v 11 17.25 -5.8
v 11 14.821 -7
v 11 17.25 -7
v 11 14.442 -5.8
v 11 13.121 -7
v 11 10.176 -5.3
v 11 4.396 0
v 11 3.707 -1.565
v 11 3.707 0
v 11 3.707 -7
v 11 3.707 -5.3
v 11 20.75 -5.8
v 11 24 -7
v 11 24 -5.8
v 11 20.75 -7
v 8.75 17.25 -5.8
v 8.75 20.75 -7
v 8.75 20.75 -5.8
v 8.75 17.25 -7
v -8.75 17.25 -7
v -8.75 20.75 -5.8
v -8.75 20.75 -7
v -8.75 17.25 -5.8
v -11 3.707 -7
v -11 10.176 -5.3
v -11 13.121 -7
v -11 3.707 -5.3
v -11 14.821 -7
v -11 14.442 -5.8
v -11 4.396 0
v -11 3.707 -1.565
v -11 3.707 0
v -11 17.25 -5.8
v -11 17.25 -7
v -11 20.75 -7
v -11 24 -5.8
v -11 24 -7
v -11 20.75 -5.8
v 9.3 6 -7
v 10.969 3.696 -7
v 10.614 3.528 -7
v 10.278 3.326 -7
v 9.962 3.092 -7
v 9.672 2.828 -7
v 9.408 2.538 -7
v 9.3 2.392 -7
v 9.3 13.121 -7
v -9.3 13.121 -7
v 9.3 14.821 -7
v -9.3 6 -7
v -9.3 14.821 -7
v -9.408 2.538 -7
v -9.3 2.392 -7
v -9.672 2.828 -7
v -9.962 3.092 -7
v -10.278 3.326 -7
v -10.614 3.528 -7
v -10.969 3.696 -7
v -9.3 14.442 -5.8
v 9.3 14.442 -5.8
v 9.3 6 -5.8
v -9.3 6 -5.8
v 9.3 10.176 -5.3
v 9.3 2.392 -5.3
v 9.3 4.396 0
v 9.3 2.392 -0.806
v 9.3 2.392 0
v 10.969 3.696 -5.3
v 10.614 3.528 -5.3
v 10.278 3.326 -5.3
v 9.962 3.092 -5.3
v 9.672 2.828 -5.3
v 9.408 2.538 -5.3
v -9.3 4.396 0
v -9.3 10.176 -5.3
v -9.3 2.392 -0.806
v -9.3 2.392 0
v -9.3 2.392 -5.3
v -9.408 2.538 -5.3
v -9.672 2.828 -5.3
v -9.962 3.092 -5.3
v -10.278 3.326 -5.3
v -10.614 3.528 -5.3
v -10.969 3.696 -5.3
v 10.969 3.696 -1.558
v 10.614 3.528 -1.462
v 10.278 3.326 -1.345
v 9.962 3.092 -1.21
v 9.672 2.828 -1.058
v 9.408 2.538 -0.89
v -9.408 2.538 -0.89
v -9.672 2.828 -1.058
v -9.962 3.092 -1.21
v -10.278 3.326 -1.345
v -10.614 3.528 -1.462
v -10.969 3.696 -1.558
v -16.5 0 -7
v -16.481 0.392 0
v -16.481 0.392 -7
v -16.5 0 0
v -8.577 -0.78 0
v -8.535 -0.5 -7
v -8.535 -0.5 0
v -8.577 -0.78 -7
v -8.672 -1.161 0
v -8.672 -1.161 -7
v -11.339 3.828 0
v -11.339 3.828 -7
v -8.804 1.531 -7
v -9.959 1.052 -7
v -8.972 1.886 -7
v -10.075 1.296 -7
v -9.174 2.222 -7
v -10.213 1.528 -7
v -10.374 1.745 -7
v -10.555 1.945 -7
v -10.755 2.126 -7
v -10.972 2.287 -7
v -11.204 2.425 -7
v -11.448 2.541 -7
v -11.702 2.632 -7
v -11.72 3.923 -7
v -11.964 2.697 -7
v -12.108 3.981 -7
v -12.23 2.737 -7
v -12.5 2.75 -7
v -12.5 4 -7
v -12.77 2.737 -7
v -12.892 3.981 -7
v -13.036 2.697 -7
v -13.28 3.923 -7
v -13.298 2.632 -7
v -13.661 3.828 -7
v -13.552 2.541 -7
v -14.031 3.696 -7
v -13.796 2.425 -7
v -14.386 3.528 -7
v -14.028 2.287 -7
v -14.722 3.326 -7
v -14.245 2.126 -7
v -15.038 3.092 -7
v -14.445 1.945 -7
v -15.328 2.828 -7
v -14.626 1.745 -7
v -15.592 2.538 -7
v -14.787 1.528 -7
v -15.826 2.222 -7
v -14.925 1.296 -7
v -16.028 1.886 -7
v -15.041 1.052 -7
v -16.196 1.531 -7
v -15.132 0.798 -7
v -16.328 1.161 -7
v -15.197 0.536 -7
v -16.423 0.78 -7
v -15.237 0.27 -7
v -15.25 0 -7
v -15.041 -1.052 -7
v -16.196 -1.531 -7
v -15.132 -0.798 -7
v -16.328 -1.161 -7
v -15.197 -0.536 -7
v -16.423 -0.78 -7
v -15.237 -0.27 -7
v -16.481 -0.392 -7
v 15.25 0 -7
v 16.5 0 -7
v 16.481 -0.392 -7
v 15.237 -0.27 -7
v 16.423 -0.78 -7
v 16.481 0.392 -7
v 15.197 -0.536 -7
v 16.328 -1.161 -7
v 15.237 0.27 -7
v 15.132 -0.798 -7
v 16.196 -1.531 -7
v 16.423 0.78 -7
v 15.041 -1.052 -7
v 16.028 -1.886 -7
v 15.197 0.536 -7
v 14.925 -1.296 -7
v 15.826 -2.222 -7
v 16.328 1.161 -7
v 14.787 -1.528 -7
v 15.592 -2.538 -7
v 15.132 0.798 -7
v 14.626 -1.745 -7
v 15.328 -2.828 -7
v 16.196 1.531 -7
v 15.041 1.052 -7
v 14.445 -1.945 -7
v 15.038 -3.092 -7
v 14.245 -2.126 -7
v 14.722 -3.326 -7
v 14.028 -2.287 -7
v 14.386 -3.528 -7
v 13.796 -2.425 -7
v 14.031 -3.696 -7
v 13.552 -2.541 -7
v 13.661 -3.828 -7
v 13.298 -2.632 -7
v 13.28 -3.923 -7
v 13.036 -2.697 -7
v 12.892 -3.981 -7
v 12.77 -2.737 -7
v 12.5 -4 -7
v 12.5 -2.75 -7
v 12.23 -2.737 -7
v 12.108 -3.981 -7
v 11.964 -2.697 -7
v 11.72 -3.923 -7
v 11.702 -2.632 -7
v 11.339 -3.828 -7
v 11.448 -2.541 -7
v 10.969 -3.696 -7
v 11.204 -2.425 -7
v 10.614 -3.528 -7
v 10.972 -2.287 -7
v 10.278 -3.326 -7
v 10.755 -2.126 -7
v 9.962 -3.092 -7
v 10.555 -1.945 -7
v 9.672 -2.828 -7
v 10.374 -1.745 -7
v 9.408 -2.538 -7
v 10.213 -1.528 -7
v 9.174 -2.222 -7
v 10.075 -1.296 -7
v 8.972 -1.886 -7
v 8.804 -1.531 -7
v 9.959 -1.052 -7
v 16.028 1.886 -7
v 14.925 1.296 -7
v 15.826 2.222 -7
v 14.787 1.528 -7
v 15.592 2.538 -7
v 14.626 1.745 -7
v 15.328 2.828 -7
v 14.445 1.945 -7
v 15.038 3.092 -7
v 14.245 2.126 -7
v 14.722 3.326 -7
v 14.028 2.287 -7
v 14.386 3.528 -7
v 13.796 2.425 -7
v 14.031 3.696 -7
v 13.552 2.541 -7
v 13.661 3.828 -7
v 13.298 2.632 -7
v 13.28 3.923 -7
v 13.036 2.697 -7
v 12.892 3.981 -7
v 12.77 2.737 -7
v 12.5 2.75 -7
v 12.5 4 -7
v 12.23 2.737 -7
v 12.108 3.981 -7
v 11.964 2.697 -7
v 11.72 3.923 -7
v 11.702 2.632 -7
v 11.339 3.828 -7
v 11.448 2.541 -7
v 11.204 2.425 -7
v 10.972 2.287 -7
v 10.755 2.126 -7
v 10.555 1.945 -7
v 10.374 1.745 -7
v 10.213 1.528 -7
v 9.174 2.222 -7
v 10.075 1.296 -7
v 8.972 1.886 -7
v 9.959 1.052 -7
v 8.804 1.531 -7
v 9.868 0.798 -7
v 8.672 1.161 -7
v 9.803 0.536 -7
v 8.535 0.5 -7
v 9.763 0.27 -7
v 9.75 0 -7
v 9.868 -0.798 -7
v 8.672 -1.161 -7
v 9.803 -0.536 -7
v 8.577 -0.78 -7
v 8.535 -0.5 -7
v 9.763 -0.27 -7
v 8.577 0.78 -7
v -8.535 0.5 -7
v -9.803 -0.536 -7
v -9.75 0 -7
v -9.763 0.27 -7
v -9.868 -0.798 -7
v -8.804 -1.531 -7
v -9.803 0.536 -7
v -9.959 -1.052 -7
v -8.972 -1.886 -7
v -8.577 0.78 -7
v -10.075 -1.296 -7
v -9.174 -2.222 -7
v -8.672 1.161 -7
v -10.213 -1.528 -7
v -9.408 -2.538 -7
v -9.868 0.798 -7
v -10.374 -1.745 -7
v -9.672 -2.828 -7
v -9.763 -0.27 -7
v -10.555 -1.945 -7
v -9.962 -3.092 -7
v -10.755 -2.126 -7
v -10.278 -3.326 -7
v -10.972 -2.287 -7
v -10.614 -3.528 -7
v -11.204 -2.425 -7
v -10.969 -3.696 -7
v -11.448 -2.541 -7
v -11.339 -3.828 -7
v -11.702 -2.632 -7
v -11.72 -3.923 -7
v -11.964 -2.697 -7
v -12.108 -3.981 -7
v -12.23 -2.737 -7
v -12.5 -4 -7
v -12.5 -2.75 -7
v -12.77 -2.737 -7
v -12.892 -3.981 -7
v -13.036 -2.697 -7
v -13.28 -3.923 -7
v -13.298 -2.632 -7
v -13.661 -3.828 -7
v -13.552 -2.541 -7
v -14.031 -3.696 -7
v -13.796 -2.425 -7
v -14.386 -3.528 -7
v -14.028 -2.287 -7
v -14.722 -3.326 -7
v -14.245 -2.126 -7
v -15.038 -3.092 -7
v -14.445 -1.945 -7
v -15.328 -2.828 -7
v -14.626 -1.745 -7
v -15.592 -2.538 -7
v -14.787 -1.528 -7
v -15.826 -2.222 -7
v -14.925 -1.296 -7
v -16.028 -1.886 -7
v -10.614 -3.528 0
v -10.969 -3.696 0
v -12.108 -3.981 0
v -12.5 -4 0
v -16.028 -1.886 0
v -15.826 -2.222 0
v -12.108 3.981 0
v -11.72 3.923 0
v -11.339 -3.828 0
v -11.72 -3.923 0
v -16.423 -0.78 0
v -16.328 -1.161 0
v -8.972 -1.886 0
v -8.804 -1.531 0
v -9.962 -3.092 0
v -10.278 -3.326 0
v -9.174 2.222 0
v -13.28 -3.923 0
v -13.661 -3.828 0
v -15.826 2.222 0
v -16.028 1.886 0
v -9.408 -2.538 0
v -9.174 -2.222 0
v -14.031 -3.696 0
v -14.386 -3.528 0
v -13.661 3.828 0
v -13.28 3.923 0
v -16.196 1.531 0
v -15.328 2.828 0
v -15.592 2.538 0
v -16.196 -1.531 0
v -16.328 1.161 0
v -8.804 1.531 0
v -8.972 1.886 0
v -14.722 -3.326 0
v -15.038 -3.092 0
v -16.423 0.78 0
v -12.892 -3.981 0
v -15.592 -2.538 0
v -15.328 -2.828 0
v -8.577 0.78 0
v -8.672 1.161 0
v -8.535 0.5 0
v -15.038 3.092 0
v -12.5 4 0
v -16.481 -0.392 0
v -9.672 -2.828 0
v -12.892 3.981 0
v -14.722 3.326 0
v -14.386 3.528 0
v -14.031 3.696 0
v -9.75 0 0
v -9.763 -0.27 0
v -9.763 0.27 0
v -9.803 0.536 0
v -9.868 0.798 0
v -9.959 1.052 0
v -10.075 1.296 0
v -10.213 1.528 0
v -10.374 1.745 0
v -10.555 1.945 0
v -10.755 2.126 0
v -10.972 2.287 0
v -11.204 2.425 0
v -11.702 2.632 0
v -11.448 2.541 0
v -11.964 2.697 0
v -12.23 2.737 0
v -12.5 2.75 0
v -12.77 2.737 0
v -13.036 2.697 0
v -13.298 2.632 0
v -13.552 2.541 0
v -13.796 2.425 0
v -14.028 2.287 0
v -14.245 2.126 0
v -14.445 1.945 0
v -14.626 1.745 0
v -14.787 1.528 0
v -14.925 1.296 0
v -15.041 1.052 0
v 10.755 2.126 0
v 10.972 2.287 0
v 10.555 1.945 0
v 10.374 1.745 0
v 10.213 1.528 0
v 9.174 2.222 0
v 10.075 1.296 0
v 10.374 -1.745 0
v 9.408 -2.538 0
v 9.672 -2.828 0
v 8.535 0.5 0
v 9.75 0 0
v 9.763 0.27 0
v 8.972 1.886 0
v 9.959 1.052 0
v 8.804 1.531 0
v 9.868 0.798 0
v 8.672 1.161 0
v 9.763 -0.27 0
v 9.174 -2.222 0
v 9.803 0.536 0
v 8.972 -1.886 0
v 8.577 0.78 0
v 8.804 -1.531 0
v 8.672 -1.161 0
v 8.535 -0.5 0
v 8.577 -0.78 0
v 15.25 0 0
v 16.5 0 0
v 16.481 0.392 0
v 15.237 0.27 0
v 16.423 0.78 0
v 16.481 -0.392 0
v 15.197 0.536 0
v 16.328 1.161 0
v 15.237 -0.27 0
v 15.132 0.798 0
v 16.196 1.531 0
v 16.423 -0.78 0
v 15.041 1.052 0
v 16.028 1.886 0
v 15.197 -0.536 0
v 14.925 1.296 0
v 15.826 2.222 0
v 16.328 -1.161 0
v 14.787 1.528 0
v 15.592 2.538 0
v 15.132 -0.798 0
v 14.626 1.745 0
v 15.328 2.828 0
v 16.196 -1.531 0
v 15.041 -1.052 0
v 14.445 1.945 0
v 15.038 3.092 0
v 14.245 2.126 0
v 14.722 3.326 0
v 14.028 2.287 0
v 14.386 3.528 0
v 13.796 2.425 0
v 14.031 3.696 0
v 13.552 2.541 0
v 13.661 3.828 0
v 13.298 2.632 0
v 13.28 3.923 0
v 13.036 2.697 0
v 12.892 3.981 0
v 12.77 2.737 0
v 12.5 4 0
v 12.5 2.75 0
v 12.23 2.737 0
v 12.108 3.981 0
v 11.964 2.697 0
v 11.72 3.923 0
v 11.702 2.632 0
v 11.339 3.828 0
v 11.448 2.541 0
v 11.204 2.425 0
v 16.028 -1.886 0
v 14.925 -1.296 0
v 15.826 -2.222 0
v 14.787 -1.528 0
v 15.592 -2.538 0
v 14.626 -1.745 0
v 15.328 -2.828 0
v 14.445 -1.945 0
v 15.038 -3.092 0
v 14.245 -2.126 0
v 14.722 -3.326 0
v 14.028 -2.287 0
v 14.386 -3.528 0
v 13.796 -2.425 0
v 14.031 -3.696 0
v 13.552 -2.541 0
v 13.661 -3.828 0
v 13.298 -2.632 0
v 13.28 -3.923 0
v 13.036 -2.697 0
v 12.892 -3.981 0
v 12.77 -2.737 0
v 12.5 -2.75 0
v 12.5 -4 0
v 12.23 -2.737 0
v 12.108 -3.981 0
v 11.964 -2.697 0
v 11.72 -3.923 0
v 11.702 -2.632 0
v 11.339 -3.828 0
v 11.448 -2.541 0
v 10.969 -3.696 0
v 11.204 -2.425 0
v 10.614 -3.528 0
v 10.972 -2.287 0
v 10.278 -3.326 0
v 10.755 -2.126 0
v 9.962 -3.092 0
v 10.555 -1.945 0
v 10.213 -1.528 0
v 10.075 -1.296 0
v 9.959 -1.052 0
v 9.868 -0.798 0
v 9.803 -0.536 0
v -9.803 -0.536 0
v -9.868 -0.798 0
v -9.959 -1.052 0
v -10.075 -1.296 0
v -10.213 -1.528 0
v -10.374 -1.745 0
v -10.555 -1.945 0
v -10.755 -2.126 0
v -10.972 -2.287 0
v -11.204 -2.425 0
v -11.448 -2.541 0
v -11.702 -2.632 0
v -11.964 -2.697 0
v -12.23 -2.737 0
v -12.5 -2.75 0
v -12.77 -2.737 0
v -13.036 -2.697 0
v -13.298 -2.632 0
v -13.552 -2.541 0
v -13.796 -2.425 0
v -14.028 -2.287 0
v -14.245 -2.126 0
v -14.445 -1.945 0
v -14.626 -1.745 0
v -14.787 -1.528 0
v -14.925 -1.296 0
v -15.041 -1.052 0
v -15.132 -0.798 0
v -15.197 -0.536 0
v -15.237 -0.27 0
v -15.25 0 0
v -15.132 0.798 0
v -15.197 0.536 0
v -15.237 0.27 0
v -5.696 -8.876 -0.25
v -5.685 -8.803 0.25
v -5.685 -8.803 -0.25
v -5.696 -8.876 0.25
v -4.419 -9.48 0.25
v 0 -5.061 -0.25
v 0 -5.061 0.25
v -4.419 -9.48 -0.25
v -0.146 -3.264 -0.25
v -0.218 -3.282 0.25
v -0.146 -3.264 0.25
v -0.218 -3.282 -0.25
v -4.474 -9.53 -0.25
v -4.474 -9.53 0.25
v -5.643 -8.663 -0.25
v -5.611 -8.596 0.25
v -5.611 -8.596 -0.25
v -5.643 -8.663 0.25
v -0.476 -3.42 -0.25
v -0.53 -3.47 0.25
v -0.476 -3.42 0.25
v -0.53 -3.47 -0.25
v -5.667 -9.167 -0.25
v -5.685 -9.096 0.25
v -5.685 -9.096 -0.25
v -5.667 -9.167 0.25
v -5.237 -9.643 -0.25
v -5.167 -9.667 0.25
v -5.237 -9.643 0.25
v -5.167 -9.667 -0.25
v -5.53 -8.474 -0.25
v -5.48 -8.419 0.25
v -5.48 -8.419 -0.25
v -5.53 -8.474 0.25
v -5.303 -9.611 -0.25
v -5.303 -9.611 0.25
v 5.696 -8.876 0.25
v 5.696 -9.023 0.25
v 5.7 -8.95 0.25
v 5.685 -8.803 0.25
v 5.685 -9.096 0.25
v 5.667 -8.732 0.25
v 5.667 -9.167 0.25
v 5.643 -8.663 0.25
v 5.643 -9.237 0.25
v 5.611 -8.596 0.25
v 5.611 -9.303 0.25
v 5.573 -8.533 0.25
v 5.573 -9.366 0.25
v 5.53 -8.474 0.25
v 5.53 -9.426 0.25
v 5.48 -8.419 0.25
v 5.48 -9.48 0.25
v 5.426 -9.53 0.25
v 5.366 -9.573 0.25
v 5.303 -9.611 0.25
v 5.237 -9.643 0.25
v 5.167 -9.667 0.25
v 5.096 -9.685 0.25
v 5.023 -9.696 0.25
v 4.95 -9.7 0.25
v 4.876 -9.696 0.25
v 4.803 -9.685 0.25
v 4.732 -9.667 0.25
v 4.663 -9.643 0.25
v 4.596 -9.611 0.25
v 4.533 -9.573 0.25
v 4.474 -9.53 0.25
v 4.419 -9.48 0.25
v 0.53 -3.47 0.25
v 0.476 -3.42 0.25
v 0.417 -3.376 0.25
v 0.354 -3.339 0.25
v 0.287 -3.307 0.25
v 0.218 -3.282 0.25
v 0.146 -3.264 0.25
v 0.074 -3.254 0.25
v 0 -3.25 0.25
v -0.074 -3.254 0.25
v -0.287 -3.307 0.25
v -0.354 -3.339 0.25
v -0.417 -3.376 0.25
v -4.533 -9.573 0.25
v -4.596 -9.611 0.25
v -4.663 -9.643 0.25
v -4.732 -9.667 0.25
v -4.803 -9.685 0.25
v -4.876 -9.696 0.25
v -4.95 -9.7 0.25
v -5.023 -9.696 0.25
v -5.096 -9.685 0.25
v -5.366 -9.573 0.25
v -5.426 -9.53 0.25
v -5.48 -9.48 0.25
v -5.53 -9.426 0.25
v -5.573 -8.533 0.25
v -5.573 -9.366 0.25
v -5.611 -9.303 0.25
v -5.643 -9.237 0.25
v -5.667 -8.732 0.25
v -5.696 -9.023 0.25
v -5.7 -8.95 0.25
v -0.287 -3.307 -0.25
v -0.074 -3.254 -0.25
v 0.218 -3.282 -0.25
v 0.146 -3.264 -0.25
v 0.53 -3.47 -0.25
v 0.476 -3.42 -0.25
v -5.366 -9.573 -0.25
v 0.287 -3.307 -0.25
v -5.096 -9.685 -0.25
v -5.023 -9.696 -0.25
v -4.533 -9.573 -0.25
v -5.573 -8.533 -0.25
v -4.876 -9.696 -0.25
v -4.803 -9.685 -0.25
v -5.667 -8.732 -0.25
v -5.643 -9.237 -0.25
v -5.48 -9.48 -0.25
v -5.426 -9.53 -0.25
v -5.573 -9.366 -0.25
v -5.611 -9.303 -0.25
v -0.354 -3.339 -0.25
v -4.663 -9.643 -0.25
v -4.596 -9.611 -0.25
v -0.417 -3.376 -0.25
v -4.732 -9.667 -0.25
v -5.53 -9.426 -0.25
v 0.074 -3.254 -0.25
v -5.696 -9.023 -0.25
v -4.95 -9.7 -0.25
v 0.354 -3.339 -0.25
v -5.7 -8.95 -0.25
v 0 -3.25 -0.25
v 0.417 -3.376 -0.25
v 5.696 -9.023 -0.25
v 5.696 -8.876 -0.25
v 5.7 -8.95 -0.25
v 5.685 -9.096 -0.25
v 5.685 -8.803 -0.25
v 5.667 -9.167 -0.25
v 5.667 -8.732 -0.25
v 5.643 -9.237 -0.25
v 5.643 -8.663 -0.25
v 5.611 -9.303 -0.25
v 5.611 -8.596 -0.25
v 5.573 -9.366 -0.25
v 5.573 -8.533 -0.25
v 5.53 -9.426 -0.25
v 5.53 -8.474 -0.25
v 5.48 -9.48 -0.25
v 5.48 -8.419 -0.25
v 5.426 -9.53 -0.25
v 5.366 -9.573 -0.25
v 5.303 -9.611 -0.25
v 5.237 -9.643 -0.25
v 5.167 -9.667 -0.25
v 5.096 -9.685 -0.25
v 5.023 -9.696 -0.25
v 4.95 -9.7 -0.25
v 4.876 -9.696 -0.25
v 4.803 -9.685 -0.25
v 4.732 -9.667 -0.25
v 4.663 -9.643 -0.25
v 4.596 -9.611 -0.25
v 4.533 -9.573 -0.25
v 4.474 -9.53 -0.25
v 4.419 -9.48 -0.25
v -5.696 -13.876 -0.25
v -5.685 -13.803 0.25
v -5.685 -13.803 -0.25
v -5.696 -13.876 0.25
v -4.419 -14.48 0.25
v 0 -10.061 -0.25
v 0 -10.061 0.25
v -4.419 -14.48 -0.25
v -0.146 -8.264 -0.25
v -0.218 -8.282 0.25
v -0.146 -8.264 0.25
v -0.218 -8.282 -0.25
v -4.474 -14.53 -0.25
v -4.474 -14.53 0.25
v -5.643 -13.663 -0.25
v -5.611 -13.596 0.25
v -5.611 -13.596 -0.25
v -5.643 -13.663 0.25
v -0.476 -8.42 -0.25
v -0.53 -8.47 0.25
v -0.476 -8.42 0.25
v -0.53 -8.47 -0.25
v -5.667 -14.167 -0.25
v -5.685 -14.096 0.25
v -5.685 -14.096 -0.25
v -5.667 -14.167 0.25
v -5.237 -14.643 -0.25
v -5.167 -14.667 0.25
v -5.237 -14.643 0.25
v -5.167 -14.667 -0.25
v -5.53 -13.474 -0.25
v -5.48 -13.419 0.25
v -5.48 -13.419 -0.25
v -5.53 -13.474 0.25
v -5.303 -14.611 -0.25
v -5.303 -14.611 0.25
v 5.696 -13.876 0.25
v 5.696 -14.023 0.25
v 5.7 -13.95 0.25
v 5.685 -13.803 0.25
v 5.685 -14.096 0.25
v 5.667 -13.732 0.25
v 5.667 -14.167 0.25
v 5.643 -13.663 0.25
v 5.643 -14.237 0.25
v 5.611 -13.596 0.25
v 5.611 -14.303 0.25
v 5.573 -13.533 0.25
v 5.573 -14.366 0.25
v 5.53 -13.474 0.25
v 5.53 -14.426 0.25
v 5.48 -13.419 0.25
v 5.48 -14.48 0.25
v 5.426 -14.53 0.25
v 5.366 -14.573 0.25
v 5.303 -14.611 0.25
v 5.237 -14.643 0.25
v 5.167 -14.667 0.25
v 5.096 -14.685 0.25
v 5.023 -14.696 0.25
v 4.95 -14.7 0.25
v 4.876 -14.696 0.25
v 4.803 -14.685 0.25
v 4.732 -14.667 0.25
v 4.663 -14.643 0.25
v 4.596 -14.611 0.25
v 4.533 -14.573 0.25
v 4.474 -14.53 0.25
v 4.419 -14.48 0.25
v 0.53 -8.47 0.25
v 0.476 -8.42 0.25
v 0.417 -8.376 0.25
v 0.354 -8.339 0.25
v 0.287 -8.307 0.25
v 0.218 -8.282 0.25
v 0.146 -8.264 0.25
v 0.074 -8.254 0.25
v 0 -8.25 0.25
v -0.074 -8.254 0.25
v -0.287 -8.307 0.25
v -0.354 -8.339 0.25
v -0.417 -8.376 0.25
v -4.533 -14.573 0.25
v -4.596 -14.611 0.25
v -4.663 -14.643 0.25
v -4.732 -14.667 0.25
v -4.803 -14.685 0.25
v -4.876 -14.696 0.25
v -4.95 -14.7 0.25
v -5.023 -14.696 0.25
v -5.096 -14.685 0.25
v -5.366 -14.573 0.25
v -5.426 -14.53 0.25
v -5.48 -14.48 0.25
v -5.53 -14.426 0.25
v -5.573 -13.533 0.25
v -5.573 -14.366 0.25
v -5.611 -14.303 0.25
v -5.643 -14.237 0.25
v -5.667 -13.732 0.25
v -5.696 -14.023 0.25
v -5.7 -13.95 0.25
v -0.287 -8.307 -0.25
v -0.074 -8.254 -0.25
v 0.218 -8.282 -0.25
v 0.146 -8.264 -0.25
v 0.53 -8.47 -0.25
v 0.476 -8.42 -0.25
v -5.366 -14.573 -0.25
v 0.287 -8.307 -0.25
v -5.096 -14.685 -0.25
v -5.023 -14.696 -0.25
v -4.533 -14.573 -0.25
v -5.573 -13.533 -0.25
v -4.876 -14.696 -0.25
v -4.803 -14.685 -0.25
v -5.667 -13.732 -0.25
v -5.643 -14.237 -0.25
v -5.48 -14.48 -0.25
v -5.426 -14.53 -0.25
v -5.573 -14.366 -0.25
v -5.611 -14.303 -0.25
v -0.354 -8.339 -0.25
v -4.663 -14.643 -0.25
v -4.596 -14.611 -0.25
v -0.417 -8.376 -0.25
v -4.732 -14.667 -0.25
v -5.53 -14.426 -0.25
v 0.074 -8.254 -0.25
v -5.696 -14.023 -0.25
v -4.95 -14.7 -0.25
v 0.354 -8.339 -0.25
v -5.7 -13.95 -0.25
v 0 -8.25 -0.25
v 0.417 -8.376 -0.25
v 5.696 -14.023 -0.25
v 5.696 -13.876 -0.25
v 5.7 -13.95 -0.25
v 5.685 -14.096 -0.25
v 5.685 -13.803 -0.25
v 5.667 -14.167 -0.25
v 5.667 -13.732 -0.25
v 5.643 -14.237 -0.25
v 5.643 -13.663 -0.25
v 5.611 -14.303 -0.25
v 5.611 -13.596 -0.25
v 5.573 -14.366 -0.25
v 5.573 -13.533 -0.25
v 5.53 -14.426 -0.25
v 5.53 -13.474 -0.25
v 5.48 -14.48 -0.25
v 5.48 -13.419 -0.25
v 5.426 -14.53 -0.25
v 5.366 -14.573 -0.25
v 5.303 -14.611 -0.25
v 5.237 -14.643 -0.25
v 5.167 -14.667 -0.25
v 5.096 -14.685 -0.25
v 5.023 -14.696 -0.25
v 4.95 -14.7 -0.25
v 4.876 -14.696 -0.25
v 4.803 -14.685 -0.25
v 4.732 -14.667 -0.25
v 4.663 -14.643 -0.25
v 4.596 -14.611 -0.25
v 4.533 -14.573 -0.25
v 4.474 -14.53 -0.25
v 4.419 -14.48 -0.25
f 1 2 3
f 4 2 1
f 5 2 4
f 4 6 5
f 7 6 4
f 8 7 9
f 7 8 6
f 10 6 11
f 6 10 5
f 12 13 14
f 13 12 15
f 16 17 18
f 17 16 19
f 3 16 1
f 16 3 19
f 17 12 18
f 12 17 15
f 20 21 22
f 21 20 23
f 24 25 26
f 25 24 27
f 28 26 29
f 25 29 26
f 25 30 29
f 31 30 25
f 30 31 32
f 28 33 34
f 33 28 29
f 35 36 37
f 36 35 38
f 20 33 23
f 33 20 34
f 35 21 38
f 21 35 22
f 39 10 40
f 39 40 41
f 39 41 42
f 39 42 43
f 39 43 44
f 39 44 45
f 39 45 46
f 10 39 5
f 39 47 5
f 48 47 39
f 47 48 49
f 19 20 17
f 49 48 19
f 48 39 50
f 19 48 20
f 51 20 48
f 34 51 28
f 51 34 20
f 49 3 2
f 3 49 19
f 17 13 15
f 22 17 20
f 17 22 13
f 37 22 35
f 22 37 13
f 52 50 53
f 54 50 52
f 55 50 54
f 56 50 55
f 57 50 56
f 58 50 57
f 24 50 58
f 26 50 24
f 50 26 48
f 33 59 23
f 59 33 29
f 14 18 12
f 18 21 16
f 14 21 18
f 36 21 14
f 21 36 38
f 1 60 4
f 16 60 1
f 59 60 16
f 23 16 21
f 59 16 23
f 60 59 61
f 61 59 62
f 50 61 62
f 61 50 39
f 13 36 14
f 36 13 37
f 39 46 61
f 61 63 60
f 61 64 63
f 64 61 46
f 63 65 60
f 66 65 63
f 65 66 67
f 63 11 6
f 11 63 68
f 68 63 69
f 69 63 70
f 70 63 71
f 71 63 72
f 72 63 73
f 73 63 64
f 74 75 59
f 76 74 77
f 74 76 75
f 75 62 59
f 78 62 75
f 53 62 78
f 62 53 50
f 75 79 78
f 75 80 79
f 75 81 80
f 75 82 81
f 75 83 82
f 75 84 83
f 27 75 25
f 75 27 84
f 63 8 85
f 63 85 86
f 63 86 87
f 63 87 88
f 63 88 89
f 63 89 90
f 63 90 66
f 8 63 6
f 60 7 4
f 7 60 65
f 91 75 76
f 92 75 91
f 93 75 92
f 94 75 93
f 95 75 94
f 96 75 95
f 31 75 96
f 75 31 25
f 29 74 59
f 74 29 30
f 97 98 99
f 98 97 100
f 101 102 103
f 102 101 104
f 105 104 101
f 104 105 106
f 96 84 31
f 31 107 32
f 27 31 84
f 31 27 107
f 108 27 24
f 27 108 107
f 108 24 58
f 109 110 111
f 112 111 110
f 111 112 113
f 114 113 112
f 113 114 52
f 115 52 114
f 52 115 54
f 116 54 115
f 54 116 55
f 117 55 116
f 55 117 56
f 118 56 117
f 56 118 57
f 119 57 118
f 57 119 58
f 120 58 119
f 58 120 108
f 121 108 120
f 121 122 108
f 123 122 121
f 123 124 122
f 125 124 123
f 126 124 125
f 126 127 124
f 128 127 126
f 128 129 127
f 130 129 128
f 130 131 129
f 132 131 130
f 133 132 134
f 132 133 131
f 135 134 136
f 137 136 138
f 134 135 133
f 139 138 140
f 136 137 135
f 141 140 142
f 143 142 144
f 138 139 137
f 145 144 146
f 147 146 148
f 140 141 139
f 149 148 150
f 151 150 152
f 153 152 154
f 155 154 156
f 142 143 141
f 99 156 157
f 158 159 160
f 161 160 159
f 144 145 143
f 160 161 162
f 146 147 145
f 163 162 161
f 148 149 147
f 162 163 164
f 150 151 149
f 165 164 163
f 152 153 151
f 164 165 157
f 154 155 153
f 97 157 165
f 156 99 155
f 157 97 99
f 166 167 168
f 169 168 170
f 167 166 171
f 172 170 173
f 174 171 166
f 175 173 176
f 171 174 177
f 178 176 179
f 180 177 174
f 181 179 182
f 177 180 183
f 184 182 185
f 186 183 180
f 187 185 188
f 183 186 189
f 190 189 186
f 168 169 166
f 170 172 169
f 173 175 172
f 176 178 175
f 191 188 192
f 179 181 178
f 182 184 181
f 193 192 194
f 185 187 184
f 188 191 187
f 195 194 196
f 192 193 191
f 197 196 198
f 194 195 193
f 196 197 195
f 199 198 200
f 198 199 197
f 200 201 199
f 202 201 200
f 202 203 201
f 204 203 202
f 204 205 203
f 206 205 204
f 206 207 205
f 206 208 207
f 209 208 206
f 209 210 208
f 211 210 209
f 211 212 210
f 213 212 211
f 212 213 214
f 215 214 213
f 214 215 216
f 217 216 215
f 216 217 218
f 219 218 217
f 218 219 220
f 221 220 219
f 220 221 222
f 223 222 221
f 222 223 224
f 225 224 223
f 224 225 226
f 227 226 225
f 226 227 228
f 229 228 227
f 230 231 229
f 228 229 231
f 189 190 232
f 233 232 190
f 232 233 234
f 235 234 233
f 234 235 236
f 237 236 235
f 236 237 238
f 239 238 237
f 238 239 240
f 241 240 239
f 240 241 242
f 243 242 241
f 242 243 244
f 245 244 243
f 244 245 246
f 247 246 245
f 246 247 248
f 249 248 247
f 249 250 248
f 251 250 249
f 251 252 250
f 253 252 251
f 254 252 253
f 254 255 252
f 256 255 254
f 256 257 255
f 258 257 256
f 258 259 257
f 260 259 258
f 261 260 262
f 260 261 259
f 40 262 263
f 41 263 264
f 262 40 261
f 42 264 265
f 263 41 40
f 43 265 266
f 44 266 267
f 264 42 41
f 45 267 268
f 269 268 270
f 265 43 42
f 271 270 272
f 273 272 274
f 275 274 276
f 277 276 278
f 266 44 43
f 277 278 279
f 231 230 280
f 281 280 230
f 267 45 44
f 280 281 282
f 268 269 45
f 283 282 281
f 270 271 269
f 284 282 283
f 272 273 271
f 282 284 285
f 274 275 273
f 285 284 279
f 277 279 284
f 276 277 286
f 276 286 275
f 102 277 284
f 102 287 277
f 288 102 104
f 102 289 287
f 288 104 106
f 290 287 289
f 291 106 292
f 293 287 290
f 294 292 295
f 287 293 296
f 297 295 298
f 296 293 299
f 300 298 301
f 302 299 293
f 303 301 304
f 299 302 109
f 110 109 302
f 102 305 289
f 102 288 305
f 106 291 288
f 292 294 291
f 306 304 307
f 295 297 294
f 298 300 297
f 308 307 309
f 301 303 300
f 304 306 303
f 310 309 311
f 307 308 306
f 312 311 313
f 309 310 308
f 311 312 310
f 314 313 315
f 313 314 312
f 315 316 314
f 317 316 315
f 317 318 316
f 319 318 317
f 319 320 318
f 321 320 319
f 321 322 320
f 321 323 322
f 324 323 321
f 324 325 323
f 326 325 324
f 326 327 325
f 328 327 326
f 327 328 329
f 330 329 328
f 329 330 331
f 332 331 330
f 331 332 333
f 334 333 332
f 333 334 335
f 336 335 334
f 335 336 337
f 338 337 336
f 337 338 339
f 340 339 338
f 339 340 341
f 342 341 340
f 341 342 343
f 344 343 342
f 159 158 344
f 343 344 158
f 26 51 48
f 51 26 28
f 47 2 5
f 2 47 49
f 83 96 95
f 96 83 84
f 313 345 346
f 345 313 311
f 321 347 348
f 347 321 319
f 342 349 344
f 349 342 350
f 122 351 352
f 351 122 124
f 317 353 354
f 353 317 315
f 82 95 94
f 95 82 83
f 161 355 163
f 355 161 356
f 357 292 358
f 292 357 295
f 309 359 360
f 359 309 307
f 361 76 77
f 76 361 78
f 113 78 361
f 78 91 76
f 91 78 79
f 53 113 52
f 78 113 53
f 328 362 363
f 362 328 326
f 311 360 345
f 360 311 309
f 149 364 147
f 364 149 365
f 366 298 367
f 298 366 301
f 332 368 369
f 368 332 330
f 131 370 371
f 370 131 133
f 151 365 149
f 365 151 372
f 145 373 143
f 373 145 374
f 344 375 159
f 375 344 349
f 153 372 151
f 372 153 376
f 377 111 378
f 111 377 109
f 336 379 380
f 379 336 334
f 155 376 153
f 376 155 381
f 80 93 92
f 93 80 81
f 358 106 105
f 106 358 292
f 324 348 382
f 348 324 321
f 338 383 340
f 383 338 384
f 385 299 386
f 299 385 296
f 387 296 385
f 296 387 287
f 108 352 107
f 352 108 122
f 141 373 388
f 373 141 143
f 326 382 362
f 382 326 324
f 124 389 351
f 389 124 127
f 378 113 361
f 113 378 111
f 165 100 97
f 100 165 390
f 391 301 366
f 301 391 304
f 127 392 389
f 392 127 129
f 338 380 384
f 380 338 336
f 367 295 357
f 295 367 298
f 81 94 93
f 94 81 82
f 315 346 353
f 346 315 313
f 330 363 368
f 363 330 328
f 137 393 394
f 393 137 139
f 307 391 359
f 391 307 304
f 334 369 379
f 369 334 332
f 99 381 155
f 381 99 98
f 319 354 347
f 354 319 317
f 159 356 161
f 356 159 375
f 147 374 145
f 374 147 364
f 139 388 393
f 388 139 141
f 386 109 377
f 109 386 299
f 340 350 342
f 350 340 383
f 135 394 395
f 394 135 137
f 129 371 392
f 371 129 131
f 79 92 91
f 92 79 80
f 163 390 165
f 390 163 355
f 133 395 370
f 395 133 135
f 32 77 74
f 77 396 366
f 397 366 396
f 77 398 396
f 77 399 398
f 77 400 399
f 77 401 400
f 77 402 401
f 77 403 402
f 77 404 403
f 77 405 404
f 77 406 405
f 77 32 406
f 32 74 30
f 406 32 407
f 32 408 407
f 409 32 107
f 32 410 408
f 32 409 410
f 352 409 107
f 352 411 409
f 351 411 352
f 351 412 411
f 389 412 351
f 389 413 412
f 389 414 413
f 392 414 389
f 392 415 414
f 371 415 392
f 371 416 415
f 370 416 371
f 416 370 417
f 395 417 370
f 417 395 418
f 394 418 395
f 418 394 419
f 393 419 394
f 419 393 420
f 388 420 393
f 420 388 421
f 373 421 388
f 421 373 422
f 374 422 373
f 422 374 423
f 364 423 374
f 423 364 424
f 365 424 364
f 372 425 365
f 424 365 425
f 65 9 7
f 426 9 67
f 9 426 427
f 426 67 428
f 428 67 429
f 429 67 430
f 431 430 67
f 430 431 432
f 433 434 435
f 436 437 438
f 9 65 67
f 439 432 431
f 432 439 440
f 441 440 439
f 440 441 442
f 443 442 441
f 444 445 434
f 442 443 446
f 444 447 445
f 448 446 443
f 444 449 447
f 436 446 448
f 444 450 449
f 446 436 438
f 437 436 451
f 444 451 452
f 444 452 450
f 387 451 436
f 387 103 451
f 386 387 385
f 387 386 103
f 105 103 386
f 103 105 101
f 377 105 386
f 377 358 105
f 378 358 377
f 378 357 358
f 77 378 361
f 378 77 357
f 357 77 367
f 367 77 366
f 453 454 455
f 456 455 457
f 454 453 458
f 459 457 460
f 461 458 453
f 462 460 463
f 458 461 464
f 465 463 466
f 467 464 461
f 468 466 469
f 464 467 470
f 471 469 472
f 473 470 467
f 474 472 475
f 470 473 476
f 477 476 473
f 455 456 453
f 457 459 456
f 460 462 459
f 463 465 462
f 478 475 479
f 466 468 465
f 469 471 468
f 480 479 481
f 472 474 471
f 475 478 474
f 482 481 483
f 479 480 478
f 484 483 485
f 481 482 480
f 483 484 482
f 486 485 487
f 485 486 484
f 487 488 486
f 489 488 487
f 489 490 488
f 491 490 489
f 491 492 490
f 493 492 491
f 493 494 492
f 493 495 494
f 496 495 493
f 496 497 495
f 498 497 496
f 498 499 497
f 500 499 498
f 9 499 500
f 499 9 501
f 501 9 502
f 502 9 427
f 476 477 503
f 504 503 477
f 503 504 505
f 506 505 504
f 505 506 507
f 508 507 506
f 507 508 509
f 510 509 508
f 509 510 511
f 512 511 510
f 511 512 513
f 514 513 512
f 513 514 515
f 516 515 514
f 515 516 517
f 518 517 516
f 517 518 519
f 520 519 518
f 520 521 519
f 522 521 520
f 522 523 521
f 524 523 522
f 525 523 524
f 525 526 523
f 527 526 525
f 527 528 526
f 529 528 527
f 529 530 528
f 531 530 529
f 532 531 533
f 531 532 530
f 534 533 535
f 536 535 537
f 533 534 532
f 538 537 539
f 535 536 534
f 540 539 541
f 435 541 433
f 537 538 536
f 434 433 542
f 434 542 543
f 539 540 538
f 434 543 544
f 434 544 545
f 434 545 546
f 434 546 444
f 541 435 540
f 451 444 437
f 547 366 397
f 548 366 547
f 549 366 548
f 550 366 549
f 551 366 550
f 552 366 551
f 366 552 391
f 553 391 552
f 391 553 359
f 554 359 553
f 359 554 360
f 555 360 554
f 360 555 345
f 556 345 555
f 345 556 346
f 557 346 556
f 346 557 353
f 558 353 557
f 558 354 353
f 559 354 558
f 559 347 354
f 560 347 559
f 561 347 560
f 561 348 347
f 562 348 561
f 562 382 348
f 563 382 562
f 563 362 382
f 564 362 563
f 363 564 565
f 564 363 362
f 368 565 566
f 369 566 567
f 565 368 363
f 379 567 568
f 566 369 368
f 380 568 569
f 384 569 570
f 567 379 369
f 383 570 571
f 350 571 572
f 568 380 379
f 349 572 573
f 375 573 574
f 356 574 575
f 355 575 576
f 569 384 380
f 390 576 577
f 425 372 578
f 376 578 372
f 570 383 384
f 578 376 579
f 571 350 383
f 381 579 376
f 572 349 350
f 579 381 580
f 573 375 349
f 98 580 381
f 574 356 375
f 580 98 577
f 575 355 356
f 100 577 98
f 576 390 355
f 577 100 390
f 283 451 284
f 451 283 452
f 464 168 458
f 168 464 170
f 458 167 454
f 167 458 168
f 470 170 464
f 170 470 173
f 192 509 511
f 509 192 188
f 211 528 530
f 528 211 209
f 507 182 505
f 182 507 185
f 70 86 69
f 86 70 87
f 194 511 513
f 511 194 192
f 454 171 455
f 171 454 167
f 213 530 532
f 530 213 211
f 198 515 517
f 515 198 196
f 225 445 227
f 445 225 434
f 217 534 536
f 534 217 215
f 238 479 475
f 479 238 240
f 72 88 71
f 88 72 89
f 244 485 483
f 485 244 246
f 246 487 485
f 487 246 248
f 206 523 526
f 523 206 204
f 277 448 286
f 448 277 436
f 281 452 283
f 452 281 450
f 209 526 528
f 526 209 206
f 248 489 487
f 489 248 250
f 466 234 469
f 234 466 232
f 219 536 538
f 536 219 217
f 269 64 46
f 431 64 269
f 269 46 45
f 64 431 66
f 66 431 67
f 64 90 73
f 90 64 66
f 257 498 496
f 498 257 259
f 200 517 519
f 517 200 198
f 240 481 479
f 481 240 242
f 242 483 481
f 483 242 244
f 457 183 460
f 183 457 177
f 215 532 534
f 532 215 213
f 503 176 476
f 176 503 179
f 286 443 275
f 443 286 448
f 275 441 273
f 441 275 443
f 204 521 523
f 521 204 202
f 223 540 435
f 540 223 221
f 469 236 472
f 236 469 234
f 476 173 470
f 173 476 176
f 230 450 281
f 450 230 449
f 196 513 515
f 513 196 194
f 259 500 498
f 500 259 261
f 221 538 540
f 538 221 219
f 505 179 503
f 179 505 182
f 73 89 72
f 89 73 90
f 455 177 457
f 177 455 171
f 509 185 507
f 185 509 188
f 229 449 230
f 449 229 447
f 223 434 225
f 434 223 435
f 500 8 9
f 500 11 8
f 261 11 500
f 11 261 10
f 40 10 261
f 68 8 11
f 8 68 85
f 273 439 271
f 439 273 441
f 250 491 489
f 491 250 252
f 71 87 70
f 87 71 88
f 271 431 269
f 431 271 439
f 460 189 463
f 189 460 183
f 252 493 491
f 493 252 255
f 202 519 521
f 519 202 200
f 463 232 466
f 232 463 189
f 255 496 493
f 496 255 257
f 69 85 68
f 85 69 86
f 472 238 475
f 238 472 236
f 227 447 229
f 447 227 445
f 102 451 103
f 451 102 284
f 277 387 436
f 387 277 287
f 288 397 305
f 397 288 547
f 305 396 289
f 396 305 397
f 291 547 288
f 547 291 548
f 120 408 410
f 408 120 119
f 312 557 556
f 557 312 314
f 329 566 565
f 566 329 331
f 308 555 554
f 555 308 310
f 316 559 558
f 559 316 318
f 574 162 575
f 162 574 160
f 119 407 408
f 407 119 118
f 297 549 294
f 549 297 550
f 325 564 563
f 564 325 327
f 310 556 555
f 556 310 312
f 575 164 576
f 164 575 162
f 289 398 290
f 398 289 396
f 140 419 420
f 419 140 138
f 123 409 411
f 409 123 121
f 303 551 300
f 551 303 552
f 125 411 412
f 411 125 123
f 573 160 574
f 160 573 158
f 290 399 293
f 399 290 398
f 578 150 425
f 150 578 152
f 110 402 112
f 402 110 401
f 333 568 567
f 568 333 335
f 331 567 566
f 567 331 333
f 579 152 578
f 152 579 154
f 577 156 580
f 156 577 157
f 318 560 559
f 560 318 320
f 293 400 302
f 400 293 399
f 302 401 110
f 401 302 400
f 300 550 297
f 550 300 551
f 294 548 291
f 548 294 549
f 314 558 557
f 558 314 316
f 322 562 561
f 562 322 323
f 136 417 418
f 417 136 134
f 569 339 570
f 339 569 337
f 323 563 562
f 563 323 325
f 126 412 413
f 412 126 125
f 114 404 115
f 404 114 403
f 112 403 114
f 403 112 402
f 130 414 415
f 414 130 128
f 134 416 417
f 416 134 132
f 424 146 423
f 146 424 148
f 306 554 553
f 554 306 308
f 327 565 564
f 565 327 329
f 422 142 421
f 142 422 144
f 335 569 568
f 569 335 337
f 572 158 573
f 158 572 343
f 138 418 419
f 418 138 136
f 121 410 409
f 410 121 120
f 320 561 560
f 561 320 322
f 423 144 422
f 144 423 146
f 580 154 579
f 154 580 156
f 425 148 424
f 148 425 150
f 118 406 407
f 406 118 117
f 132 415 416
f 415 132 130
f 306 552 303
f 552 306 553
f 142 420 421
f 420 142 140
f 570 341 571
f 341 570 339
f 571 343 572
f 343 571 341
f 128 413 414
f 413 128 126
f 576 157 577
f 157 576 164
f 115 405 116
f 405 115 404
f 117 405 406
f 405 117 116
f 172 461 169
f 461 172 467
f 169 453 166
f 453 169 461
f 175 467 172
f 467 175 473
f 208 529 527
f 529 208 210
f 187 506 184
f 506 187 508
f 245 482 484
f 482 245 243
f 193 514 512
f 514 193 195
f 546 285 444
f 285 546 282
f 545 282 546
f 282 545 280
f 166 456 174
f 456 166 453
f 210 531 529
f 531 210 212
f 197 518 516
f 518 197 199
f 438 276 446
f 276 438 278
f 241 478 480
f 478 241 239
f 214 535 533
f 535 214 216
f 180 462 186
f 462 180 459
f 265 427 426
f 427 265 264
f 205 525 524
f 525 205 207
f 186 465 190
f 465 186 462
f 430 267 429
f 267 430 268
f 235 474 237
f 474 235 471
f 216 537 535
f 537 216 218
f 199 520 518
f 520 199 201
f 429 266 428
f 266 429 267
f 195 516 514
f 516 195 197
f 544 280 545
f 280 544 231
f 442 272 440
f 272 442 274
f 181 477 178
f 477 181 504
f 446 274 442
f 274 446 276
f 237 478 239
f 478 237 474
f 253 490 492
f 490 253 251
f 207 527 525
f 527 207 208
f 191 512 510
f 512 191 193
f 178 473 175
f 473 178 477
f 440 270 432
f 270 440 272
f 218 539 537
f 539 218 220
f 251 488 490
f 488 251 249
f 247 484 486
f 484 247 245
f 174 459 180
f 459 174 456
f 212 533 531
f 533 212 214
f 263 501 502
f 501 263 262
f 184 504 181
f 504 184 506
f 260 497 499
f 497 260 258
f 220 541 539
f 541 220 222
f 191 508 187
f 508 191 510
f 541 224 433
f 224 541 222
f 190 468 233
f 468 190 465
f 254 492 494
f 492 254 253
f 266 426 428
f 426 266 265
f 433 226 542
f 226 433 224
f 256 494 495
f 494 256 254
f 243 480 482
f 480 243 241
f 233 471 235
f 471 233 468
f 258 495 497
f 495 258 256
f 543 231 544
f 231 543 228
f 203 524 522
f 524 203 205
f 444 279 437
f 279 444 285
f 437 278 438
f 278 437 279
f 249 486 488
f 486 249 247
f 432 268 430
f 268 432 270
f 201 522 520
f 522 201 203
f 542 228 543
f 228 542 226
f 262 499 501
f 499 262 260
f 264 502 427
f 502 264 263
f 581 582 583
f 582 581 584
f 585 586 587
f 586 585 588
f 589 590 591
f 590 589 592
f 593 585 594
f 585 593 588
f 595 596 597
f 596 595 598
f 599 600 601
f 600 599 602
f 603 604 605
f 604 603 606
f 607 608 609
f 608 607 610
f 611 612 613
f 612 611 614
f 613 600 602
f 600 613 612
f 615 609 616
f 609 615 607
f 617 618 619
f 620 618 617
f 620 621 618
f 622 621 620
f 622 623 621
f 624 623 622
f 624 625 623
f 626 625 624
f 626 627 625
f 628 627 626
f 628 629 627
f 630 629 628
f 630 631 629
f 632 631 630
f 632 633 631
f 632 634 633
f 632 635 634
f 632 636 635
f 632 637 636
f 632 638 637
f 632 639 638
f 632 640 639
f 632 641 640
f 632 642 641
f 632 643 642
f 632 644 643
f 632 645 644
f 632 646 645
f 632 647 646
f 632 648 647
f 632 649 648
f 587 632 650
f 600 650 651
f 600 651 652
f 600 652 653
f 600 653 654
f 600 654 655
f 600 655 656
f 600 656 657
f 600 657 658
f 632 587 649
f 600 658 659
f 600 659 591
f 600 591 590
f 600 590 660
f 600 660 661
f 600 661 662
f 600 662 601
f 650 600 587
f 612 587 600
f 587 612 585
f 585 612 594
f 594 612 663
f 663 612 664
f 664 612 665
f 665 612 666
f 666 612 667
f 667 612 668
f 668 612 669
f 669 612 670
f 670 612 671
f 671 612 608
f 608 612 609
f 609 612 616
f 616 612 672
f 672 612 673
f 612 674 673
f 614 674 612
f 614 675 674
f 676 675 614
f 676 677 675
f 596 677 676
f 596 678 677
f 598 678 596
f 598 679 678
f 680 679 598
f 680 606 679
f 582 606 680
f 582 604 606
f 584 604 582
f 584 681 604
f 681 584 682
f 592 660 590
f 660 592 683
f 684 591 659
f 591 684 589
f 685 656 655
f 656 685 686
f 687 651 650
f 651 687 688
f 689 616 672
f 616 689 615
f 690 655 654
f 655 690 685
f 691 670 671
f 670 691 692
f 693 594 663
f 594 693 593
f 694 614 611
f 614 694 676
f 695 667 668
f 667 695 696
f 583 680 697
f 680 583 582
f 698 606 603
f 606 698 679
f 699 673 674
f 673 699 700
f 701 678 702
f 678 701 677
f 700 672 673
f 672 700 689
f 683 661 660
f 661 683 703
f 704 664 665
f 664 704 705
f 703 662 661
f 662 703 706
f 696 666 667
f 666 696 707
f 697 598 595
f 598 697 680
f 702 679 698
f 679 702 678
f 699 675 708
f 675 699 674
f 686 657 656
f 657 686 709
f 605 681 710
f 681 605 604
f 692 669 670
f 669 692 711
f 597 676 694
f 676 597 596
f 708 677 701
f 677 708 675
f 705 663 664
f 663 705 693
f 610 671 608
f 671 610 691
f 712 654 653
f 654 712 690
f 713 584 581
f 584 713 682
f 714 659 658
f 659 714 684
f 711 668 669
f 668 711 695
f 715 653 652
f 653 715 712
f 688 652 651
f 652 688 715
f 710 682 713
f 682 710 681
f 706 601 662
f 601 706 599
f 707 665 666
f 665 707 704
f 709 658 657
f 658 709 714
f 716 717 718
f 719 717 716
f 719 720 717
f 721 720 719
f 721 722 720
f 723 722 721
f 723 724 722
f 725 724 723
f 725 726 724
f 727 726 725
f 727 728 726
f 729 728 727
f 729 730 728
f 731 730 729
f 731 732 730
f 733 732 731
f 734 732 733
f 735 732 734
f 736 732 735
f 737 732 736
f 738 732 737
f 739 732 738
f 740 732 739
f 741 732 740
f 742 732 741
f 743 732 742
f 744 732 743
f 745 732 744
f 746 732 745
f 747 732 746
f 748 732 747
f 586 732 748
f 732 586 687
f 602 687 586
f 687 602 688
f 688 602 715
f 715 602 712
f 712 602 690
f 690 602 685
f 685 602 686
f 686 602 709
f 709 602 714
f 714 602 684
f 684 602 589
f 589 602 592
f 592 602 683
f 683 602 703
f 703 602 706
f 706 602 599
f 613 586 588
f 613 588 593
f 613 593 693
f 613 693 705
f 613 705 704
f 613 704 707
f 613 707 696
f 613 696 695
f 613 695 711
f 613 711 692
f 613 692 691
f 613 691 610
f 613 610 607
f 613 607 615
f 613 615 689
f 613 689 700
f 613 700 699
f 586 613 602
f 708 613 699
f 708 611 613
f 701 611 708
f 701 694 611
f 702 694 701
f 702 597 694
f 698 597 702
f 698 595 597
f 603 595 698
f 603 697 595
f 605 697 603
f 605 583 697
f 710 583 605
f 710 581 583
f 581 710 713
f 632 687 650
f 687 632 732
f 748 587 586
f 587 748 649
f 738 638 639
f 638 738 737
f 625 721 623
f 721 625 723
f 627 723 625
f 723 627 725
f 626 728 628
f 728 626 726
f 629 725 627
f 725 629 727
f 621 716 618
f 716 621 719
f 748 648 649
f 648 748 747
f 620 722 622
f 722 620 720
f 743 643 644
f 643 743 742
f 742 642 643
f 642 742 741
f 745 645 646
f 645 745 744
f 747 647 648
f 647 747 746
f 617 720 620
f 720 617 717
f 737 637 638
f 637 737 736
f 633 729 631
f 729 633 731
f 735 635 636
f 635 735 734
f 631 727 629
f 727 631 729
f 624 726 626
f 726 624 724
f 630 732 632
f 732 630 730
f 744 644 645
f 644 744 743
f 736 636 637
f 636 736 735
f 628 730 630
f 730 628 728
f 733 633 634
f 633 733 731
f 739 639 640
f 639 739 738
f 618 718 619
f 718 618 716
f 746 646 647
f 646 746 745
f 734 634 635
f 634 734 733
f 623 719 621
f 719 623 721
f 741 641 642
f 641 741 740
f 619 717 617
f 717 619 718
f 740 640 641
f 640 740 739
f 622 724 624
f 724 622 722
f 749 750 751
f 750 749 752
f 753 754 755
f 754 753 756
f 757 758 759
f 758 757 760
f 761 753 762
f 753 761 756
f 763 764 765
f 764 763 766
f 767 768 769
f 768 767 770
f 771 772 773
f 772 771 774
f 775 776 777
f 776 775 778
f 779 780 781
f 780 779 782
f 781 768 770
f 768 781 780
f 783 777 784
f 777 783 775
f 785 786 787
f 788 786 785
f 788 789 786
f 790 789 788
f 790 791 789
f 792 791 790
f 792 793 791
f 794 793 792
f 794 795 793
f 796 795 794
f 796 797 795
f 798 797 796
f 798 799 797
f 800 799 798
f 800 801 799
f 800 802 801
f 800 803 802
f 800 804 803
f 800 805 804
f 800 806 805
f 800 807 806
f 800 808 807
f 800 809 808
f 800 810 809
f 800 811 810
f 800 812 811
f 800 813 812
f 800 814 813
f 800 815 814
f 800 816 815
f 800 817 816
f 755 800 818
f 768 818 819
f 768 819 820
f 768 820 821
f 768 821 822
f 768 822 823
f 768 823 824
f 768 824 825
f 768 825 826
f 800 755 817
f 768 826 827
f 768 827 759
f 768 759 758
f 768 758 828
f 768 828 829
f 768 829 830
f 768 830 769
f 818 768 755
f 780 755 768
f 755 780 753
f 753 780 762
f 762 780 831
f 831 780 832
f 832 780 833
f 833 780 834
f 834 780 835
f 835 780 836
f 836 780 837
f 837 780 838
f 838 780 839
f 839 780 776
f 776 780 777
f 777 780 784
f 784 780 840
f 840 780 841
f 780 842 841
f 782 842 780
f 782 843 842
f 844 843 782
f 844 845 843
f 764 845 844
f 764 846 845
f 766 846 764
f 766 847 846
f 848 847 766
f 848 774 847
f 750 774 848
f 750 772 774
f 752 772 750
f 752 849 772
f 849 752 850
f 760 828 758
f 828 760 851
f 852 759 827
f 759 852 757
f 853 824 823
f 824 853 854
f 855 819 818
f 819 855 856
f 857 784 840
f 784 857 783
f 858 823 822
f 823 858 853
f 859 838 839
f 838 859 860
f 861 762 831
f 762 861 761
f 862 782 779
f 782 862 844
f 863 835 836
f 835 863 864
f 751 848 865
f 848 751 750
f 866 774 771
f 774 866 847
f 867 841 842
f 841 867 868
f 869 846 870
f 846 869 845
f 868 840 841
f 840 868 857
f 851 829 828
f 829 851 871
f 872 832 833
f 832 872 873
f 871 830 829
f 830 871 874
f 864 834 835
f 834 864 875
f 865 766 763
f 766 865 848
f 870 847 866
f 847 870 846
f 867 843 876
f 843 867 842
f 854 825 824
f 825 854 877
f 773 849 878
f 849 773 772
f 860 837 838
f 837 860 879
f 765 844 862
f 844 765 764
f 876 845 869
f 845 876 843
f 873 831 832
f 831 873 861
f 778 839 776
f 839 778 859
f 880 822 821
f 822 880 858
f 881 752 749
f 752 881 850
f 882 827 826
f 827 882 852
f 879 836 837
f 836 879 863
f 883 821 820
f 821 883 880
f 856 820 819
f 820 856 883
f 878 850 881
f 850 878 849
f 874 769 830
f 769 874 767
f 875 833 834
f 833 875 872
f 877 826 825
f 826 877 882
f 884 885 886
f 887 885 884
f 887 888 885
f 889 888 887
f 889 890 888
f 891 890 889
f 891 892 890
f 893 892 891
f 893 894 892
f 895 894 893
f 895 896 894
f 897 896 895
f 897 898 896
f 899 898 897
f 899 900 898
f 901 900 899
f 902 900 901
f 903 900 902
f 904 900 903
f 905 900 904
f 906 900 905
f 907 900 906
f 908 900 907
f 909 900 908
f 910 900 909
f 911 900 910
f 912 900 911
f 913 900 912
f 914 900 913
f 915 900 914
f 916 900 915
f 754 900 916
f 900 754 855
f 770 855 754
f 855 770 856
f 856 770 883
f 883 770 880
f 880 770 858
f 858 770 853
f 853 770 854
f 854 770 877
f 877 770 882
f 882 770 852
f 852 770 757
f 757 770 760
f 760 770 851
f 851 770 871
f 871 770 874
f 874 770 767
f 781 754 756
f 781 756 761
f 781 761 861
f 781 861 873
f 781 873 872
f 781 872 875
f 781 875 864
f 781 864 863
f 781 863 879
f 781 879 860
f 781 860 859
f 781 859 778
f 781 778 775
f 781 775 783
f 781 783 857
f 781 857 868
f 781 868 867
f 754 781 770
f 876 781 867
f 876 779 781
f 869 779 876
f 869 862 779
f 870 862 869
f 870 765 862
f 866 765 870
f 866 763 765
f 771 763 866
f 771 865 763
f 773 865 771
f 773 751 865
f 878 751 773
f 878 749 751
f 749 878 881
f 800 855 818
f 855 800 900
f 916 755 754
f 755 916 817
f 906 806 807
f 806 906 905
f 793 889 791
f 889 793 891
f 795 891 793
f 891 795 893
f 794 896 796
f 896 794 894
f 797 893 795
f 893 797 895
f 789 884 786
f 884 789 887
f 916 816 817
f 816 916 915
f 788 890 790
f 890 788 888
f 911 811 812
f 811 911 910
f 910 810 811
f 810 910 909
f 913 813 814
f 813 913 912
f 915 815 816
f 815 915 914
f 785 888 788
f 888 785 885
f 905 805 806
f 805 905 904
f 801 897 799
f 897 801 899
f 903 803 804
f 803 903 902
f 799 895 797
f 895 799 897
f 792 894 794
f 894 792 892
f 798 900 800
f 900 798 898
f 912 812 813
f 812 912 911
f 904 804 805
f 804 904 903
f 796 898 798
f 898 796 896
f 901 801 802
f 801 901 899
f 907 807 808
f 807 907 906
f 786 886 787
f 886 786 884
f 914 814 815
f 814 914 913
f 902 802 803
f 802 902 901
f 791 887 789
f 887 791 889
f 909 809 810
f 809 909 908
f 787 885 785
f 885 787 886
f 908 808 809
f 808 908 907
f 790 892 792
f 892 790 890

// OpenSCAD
/* [MOUNT] */
WIDTH = 25.0;
MOUNT_DIAMETER = 5.5;  //4.95
MOUNT_THICKNESS = 2.5;
MOUNT_HEIGHT= 7.00;     // 6.75

/* [BRIDGE] */
BRIDGE_WIDTH = WIDTH - 10;   //8 is not catching up to much
MIN_BRIDGE_WIDTH = WIDTH - 13;
BRIDGE_HEIGHT = 10;     // MOUNT_HEIGHT -->14
BRIDGE_ANGLE = 55;      // [0:5:60]
BRIDGE_X_OFFSET = 18;    // [0:1:20]
BRIDGE_Z_OFFSET = 3.5;    // [0:1:15] -->2.5
BRIDGE_THICKNESS = 1.5;

/* [VERTICAL_BRIDGE] */
VERTICAL_BRIDGE_WIDTH = WIDTH - 6;  //-6
VERTICAL_BRIDGE_THICKNESS = 1;
VERTICAL_BRIDGE_OFFSET = -VERTICAL_BRIDGE_THICKNESS/2;

/* [SMA] */
SMA_HOLE_OFFSET = -0.5; //1, -3.2
SMA_HOLE_DIAMETER = 6.5;
SMA_OUTLINER_DIAMETER = 0;
SMA_CUTOUT_WIDTH = WIDTH - 4*MOUNT_THICKNESS - 4.2; //-3.8
SMA_CUTOUT_HEIGHT = 8; //12

/* [SHELF] */
WITH_SHELF = true;    //[true, false]
SHELF_ONLY = true;
VTX_WIDTH = 17.5;
SHELF_WIDTH = VTX_WIDTH + 4.5 ; 
SHELF_LENGTH = 18;
SHELF_Y_OFFSET = 6;    //10
SHELF_THICKNESS = 1.2;
ADDITIONAL_CUTOUT_ANGLE = BRIDGE_ANGLE - 35;
ADDITIONAL_CUTOUT_Z_OFFSET = 1;

/* [ARROWS] */
WITH_ARROWS = true;     //[true, false]
ARROWS_SPACER = 7;
ARROWS_THICKNESS = 0.5;
ARROWS_ARM_WIDTH = 1.5;
ARROWS_ARM_LENGTH = 7;

/* [META] */
ZIPTIE_WIDTH = 3.5;
ZIPTIE_THICKNESS = 1.6; //0.7

TEST_WIDTH = false;     // [false, true]
HULL_TYPE = 2;          // [-1,0,1,2]
CORNERS_DIAMETER = 4;
BOUNDED = true;         // [true, false]
FN = 64;                // [0:32:256]  

/* [HIDDEN] */
$fn = FN;
DEBUG = false;

rotate([180,0,0])
sma_holder();

module sma_holder(){
    difference(){
        if(TEST_WIDTH){
            union(){
                side_mounts(2);       
                vertical_bridge(2);                     
            }
        }
        else if(SHELF_ONLY){
            union(){
                if(WITH_SHELF){
                    translate([0,0,MOUNT_HEIGHT])
                    shelf(SHELF_THICKNESS);
                }                    
                side_mounts(MOUNT_HEIGHT);
                vertical_bridge(MOUNT_HEIGHT);  
            }                
        }
        else{        
            if(HULL_TYPE==0){
                union(){
                    if(WITH_SHELF){
                        translate([0,0,MOUNT_HEIGHT])                        
                        shelf(SHELF_THICKNESS);
                    }                    
                    side_mounts(MOUNT_HEIGHT);
                    translate([0, VERTICAL_BRIDGE_OFFSET, 0])     
                    vertical_bridge(MOUNT_HEIGHT);                
                    bridge_with_mount();   
                }            
            }
            if(HULL_TYPE==1){            
                hull(){
                    if(WITH_SHELF){
                        translate([0,0,MOUNT_HEIGHT])                        
                        shelf(SHELF_THICKNESS);
                    }                     
                    side_mounts(MOUNT_HEIGHT);
                    translate([0, VERTICAL_BRIDGE_OFFSET, 0])     
                    vertical_bridge(MOUNT_HEIGHT);
                    bridge_with_mount();            
                }
            }
            if(HULL_TYPE==2){
                union(){
                    if(WITH_SHELF){
                        translate([0,0,MOUNT_HEIGHT])
                        shelf(SHELF_THICKNESS);
                    }                    
                    side_mounts(MOUNT_HEIGHT);
                    hull(){
                        translate([0, VERTICAL_BRIDGE_OFFSET, 0])                        
                        vertical_bridge(MOUNT_HEIGHT);                
                        bridge_with_mount();                            
                    }
                }            
            }
        }      

        // Poles
        side_poles();
        
        
        // Holder cutouts
        translate([0,BRIDGE_X_OFFSET, BRIDGE_THICKNESS/2 + BRIDGE_Z_OFFSET])
        rotate([BRIDGE_ANGLE,0,0])       
        union(){
            translate([0,SMA_HOLE_OFFSET,0])
            sma_hole();
            
            translate([0,SMA_HOLE_OFFSET,0])
            sma_outliner();                 
            
            translate([0,SMA_HOLE_OFFSET,0])
            sma_plate();        
        }
        
        //Additional cutout
        if(WITH_SHELF && !SHELF_ONLY){
            union(){
                width = BRIDGE_WIDTH - 2;
                cutout_thickness = 5;
                translate([0,2,MOUNT_HEIGHT-cutout_thickness/2+ADDITIONAL_CUTOUT_Z_OFFSET])
                rotate([ADDITIONAL_CUTOUT_ANGLE,0,0])
                cube([width, 30 , cutout_thickness],true);            
            }
        }
        
        if(BOUNDED){
            // LOWER bound
            translate([0,0,-WIDTH/2])
            cube([WIDTH*2, WIDTH*2, WIDTH], true);
            
            // UPPER bound    
            translate([0,0,MOUNT_HEIGHT+WIDTH/2])
            cube([WIDTH*2, WIDTH*2, WIDTH], true);   
        }        
        
    }
    
    if(DEBUG){
        translate([0,BRIDGE_X_OFFSET, BRIDGE_THICKNESS/2 + BRIDGE_Z_OFFSET])
        rotate([BRIDGE_ANGLE,0,0])       
        union(){
            translate([0,SMA_HOLE_OFFSET,0])
            sma_hole();
            
            translate([0,SMA_HOLE_OFFSET,0])
            sma_outliner();                 
            
            translate([0,SMA_HOLE_OFFSET,0])            
            sma_plate();        
        }                
    }
    
    if(WITH_ARROWS){
        rotate([180,0,0])
        translate([0,-2,0])
        union(){
            translate([0,-2,0])
            arrows(ARROWS_THICKNESS);
            translate([0,-ARROWS_SPACER,0])
            arrows(ARROWS_THICKNESS);    
        }
    }
    
}

module side_mounts(height){
    x_offset = WIDTH/2;
    
    translate([-x_offset,0,0])    
    mount(height);

    translate([x_offset,0,0])
    mount(height);    
}

module mount(height){
    outside_diameter = MOUNT_DIAMETER + MOUNT_THICKNESS;    
    
    translate([0,0, height/2])
    cylinder(height, outside_diameter/2, outside_diameter/2, true);
}

module side_poles(){
    x_offset = WIDTH/2;
    
    translate([-x_offset,0,0])    
    pole();

    translate([x_offset,0,0])
    pole();       
}

module pole(){
    outside_diameter = MOUNT_DIAMETER + MOUNT_THICKNESS;    
    
    translate([0,0, MOUNT_HEIGHT/2])
    cylinder(MOUNT_HEIGHT*2, MOUNT_DIAMETER/2, MOUNT_DIAMETER/2, true);        
}

module vertical_bridge(height){
    translate([0,0, height/2])    
    cube([VERTICAL_BRIDGE_WIDTH, VERTICAL_BRIDGE_THICKNESS, height], true);      
}

module bridge_with_mount(){ 
    translate([0,BRIDGE_X_OFFSET, BRIDGE_THICKNESS/2 + BRIDGE_Z_OFFSET])
    rotate([BRIDGE_ANGLE,0,0])    
    bridge(BRIDGE_WIDTH, MIN_BRIDGE_WIDTH, BRIDGE_HEIGHT, BRIDGE_THICKNESS);  
}

module bridge(wider_width, min_width, height, thickness){
    rounded_corners_trapeze(wider_width, min_width, height, thickness, CORNERS_DIAMETER);
}

module sma_hole(){
    color("grey")
    cylinder(BRIDGE_THICKNESS*20, SMA_HOLE_DIAMETER/2, SMA_HOLE_DIAMETER/2, true);            
}

module sma_outliner(){
    outliner_thickness = BRIDGE_THICKNESS*10;
    color("grey")    
    translate([0,0,outliner_thickness/2])    
    cylinder(outliner_thickness, SMA_OUTLINER_DIAMETER/2, SMA_OUTLINER_DIAMETER/2, true);            
}

module sma_plate(){
    outliner_thickness = BRIDGE_THICKNESS*20;
    color("grey")
    translate([0,0,outliner_thickness/2+BRIDGE_THICKNESS/2])
    cube([SMA_CUTOUT_WIDTH, SMA_CUTOUT_HEIGHT, outliner_thickness], true);            
}


module shelf(thickness){
    holder_thickness = thickness + 0.5;
    width = SHELF_WIDTH;
    
    translate([0,-SHELF_LENGTH/2-SHELF_Y_OFFSET,-thickness/2])
    difference(){
        cube([width, SHELF_LENGTH, thickness], true);
        translate([0,-4,0])        
        shelf_zipties(width, thickness);    
    }
    
    straight_shelf_holders(width, holder_thickness);

//    translate([0,0,-MOUNT_HEIGHT+holder_thickness])
//    straight_shelf_holders(BRIDGE_WIDTH, holder_thickness);    
    
    angled_shelf_holders(width, holder_thickness);
    
//    translate([0,-15,0])
//    vtx(2);
}

module shelf_zipties(width, thickness){
    ziptie_cutout = (SHELF_WIDTH - VTX_WIDTH)/2;    
    x_offset = width/2 - ziptie_cutout/2;
    y_offset = 0;    
    
    union(){
        translate([x_offset, 0, 0])
        shelf_ziptie(ziptie_cutout, thickness);
        
        translate([-x_offset, 0, 0])
        shelf_ziptie(ziptie_cutout, thickness);    
    }         
}

module shelf_ziptie(ziptie_cutout, thickness){
    cube([ziptie_cutout, ZIPTIE_WIDTH, thickness*2], true);  
}

module straight_shelf_holders(width, thickness){
    angle = 90;
    length1 = 10;
    x_offset = width/2 - thickness/2;
    y_offset = 2;
    
    translate([0,-y_offset,-thickness/2])
    rotate([angle,0,0])
    union(){
        translate([x_offset, 0, 0])
        shelf_holder(thickness, length1);
        
        translate([-x_offset, 0, 0])
        shelf_holder(thickness, length1);    
    }    
}

module angled_shelf_holders(width, thickness){
    angle = 60;
    length1 = 20;
    x_offset = width/2 - thickness/2;
    y_offset = 2.5;
    
    translate([0,y_offset,-length1/2])
    rotate([angle,0,0])
    union(){
        translate([x_offset, 0, 0])
        shelf_holder(thickness, length1);
        
        translate([-x_offset, 0, 0])
        shelf_holder(thickness, length1);    
    }
}

module shelf_holder(thickness, length){
    translate([0,0,length/2])
    cube([thickness, thickness, length], true);       
    
}

module arrow_arm(thickness){
    width = ARROWS_ARM_WIDTH;
    length = ARROWS_ARM_LENGTH;
    hull(){
        cylinder(thickness,width/2, width/2, true);

        translate([-length,0,0])
        cylinder(thickness,width/2, width/2, true);        
    }    
}

module arrows(thickness){
    angle = 45;
    
    rotate([0,0,angle])
    arrow_arm(thickness);
    
    rotate([0,0,180-angle])    
    arrow_arm(thickness);
}

module rounded_corners_trapeze(bottom_width, upper_width, height, depth, corner_curve){
    x_translate = bottom_width-corner_curve;
    x_translate2 = upper_width-corner_curve;    
    y_translate = height-corner_curve;
    
    
    hull(){
            translate([-x_translate/2, -y_translate/2, 0])
            cylinder(depth,corner_curve/2, corner_curve/2, true);    
            
            translate([-x_translate2/2, y_translate/2, 0])
            cylinder(depth,corner_curve/2, corner_curve/2, true);

            translate([x_translate2/2, y_translate/2, 0])
            cylinder(depth,corner_curve/2, corner_curve/2, true);        
            
            translate([x_translate/2, -y_translate/2, 0])
            cylinder(depth,corner_curve/2, corner_curve/2, true);        
    }        
}
